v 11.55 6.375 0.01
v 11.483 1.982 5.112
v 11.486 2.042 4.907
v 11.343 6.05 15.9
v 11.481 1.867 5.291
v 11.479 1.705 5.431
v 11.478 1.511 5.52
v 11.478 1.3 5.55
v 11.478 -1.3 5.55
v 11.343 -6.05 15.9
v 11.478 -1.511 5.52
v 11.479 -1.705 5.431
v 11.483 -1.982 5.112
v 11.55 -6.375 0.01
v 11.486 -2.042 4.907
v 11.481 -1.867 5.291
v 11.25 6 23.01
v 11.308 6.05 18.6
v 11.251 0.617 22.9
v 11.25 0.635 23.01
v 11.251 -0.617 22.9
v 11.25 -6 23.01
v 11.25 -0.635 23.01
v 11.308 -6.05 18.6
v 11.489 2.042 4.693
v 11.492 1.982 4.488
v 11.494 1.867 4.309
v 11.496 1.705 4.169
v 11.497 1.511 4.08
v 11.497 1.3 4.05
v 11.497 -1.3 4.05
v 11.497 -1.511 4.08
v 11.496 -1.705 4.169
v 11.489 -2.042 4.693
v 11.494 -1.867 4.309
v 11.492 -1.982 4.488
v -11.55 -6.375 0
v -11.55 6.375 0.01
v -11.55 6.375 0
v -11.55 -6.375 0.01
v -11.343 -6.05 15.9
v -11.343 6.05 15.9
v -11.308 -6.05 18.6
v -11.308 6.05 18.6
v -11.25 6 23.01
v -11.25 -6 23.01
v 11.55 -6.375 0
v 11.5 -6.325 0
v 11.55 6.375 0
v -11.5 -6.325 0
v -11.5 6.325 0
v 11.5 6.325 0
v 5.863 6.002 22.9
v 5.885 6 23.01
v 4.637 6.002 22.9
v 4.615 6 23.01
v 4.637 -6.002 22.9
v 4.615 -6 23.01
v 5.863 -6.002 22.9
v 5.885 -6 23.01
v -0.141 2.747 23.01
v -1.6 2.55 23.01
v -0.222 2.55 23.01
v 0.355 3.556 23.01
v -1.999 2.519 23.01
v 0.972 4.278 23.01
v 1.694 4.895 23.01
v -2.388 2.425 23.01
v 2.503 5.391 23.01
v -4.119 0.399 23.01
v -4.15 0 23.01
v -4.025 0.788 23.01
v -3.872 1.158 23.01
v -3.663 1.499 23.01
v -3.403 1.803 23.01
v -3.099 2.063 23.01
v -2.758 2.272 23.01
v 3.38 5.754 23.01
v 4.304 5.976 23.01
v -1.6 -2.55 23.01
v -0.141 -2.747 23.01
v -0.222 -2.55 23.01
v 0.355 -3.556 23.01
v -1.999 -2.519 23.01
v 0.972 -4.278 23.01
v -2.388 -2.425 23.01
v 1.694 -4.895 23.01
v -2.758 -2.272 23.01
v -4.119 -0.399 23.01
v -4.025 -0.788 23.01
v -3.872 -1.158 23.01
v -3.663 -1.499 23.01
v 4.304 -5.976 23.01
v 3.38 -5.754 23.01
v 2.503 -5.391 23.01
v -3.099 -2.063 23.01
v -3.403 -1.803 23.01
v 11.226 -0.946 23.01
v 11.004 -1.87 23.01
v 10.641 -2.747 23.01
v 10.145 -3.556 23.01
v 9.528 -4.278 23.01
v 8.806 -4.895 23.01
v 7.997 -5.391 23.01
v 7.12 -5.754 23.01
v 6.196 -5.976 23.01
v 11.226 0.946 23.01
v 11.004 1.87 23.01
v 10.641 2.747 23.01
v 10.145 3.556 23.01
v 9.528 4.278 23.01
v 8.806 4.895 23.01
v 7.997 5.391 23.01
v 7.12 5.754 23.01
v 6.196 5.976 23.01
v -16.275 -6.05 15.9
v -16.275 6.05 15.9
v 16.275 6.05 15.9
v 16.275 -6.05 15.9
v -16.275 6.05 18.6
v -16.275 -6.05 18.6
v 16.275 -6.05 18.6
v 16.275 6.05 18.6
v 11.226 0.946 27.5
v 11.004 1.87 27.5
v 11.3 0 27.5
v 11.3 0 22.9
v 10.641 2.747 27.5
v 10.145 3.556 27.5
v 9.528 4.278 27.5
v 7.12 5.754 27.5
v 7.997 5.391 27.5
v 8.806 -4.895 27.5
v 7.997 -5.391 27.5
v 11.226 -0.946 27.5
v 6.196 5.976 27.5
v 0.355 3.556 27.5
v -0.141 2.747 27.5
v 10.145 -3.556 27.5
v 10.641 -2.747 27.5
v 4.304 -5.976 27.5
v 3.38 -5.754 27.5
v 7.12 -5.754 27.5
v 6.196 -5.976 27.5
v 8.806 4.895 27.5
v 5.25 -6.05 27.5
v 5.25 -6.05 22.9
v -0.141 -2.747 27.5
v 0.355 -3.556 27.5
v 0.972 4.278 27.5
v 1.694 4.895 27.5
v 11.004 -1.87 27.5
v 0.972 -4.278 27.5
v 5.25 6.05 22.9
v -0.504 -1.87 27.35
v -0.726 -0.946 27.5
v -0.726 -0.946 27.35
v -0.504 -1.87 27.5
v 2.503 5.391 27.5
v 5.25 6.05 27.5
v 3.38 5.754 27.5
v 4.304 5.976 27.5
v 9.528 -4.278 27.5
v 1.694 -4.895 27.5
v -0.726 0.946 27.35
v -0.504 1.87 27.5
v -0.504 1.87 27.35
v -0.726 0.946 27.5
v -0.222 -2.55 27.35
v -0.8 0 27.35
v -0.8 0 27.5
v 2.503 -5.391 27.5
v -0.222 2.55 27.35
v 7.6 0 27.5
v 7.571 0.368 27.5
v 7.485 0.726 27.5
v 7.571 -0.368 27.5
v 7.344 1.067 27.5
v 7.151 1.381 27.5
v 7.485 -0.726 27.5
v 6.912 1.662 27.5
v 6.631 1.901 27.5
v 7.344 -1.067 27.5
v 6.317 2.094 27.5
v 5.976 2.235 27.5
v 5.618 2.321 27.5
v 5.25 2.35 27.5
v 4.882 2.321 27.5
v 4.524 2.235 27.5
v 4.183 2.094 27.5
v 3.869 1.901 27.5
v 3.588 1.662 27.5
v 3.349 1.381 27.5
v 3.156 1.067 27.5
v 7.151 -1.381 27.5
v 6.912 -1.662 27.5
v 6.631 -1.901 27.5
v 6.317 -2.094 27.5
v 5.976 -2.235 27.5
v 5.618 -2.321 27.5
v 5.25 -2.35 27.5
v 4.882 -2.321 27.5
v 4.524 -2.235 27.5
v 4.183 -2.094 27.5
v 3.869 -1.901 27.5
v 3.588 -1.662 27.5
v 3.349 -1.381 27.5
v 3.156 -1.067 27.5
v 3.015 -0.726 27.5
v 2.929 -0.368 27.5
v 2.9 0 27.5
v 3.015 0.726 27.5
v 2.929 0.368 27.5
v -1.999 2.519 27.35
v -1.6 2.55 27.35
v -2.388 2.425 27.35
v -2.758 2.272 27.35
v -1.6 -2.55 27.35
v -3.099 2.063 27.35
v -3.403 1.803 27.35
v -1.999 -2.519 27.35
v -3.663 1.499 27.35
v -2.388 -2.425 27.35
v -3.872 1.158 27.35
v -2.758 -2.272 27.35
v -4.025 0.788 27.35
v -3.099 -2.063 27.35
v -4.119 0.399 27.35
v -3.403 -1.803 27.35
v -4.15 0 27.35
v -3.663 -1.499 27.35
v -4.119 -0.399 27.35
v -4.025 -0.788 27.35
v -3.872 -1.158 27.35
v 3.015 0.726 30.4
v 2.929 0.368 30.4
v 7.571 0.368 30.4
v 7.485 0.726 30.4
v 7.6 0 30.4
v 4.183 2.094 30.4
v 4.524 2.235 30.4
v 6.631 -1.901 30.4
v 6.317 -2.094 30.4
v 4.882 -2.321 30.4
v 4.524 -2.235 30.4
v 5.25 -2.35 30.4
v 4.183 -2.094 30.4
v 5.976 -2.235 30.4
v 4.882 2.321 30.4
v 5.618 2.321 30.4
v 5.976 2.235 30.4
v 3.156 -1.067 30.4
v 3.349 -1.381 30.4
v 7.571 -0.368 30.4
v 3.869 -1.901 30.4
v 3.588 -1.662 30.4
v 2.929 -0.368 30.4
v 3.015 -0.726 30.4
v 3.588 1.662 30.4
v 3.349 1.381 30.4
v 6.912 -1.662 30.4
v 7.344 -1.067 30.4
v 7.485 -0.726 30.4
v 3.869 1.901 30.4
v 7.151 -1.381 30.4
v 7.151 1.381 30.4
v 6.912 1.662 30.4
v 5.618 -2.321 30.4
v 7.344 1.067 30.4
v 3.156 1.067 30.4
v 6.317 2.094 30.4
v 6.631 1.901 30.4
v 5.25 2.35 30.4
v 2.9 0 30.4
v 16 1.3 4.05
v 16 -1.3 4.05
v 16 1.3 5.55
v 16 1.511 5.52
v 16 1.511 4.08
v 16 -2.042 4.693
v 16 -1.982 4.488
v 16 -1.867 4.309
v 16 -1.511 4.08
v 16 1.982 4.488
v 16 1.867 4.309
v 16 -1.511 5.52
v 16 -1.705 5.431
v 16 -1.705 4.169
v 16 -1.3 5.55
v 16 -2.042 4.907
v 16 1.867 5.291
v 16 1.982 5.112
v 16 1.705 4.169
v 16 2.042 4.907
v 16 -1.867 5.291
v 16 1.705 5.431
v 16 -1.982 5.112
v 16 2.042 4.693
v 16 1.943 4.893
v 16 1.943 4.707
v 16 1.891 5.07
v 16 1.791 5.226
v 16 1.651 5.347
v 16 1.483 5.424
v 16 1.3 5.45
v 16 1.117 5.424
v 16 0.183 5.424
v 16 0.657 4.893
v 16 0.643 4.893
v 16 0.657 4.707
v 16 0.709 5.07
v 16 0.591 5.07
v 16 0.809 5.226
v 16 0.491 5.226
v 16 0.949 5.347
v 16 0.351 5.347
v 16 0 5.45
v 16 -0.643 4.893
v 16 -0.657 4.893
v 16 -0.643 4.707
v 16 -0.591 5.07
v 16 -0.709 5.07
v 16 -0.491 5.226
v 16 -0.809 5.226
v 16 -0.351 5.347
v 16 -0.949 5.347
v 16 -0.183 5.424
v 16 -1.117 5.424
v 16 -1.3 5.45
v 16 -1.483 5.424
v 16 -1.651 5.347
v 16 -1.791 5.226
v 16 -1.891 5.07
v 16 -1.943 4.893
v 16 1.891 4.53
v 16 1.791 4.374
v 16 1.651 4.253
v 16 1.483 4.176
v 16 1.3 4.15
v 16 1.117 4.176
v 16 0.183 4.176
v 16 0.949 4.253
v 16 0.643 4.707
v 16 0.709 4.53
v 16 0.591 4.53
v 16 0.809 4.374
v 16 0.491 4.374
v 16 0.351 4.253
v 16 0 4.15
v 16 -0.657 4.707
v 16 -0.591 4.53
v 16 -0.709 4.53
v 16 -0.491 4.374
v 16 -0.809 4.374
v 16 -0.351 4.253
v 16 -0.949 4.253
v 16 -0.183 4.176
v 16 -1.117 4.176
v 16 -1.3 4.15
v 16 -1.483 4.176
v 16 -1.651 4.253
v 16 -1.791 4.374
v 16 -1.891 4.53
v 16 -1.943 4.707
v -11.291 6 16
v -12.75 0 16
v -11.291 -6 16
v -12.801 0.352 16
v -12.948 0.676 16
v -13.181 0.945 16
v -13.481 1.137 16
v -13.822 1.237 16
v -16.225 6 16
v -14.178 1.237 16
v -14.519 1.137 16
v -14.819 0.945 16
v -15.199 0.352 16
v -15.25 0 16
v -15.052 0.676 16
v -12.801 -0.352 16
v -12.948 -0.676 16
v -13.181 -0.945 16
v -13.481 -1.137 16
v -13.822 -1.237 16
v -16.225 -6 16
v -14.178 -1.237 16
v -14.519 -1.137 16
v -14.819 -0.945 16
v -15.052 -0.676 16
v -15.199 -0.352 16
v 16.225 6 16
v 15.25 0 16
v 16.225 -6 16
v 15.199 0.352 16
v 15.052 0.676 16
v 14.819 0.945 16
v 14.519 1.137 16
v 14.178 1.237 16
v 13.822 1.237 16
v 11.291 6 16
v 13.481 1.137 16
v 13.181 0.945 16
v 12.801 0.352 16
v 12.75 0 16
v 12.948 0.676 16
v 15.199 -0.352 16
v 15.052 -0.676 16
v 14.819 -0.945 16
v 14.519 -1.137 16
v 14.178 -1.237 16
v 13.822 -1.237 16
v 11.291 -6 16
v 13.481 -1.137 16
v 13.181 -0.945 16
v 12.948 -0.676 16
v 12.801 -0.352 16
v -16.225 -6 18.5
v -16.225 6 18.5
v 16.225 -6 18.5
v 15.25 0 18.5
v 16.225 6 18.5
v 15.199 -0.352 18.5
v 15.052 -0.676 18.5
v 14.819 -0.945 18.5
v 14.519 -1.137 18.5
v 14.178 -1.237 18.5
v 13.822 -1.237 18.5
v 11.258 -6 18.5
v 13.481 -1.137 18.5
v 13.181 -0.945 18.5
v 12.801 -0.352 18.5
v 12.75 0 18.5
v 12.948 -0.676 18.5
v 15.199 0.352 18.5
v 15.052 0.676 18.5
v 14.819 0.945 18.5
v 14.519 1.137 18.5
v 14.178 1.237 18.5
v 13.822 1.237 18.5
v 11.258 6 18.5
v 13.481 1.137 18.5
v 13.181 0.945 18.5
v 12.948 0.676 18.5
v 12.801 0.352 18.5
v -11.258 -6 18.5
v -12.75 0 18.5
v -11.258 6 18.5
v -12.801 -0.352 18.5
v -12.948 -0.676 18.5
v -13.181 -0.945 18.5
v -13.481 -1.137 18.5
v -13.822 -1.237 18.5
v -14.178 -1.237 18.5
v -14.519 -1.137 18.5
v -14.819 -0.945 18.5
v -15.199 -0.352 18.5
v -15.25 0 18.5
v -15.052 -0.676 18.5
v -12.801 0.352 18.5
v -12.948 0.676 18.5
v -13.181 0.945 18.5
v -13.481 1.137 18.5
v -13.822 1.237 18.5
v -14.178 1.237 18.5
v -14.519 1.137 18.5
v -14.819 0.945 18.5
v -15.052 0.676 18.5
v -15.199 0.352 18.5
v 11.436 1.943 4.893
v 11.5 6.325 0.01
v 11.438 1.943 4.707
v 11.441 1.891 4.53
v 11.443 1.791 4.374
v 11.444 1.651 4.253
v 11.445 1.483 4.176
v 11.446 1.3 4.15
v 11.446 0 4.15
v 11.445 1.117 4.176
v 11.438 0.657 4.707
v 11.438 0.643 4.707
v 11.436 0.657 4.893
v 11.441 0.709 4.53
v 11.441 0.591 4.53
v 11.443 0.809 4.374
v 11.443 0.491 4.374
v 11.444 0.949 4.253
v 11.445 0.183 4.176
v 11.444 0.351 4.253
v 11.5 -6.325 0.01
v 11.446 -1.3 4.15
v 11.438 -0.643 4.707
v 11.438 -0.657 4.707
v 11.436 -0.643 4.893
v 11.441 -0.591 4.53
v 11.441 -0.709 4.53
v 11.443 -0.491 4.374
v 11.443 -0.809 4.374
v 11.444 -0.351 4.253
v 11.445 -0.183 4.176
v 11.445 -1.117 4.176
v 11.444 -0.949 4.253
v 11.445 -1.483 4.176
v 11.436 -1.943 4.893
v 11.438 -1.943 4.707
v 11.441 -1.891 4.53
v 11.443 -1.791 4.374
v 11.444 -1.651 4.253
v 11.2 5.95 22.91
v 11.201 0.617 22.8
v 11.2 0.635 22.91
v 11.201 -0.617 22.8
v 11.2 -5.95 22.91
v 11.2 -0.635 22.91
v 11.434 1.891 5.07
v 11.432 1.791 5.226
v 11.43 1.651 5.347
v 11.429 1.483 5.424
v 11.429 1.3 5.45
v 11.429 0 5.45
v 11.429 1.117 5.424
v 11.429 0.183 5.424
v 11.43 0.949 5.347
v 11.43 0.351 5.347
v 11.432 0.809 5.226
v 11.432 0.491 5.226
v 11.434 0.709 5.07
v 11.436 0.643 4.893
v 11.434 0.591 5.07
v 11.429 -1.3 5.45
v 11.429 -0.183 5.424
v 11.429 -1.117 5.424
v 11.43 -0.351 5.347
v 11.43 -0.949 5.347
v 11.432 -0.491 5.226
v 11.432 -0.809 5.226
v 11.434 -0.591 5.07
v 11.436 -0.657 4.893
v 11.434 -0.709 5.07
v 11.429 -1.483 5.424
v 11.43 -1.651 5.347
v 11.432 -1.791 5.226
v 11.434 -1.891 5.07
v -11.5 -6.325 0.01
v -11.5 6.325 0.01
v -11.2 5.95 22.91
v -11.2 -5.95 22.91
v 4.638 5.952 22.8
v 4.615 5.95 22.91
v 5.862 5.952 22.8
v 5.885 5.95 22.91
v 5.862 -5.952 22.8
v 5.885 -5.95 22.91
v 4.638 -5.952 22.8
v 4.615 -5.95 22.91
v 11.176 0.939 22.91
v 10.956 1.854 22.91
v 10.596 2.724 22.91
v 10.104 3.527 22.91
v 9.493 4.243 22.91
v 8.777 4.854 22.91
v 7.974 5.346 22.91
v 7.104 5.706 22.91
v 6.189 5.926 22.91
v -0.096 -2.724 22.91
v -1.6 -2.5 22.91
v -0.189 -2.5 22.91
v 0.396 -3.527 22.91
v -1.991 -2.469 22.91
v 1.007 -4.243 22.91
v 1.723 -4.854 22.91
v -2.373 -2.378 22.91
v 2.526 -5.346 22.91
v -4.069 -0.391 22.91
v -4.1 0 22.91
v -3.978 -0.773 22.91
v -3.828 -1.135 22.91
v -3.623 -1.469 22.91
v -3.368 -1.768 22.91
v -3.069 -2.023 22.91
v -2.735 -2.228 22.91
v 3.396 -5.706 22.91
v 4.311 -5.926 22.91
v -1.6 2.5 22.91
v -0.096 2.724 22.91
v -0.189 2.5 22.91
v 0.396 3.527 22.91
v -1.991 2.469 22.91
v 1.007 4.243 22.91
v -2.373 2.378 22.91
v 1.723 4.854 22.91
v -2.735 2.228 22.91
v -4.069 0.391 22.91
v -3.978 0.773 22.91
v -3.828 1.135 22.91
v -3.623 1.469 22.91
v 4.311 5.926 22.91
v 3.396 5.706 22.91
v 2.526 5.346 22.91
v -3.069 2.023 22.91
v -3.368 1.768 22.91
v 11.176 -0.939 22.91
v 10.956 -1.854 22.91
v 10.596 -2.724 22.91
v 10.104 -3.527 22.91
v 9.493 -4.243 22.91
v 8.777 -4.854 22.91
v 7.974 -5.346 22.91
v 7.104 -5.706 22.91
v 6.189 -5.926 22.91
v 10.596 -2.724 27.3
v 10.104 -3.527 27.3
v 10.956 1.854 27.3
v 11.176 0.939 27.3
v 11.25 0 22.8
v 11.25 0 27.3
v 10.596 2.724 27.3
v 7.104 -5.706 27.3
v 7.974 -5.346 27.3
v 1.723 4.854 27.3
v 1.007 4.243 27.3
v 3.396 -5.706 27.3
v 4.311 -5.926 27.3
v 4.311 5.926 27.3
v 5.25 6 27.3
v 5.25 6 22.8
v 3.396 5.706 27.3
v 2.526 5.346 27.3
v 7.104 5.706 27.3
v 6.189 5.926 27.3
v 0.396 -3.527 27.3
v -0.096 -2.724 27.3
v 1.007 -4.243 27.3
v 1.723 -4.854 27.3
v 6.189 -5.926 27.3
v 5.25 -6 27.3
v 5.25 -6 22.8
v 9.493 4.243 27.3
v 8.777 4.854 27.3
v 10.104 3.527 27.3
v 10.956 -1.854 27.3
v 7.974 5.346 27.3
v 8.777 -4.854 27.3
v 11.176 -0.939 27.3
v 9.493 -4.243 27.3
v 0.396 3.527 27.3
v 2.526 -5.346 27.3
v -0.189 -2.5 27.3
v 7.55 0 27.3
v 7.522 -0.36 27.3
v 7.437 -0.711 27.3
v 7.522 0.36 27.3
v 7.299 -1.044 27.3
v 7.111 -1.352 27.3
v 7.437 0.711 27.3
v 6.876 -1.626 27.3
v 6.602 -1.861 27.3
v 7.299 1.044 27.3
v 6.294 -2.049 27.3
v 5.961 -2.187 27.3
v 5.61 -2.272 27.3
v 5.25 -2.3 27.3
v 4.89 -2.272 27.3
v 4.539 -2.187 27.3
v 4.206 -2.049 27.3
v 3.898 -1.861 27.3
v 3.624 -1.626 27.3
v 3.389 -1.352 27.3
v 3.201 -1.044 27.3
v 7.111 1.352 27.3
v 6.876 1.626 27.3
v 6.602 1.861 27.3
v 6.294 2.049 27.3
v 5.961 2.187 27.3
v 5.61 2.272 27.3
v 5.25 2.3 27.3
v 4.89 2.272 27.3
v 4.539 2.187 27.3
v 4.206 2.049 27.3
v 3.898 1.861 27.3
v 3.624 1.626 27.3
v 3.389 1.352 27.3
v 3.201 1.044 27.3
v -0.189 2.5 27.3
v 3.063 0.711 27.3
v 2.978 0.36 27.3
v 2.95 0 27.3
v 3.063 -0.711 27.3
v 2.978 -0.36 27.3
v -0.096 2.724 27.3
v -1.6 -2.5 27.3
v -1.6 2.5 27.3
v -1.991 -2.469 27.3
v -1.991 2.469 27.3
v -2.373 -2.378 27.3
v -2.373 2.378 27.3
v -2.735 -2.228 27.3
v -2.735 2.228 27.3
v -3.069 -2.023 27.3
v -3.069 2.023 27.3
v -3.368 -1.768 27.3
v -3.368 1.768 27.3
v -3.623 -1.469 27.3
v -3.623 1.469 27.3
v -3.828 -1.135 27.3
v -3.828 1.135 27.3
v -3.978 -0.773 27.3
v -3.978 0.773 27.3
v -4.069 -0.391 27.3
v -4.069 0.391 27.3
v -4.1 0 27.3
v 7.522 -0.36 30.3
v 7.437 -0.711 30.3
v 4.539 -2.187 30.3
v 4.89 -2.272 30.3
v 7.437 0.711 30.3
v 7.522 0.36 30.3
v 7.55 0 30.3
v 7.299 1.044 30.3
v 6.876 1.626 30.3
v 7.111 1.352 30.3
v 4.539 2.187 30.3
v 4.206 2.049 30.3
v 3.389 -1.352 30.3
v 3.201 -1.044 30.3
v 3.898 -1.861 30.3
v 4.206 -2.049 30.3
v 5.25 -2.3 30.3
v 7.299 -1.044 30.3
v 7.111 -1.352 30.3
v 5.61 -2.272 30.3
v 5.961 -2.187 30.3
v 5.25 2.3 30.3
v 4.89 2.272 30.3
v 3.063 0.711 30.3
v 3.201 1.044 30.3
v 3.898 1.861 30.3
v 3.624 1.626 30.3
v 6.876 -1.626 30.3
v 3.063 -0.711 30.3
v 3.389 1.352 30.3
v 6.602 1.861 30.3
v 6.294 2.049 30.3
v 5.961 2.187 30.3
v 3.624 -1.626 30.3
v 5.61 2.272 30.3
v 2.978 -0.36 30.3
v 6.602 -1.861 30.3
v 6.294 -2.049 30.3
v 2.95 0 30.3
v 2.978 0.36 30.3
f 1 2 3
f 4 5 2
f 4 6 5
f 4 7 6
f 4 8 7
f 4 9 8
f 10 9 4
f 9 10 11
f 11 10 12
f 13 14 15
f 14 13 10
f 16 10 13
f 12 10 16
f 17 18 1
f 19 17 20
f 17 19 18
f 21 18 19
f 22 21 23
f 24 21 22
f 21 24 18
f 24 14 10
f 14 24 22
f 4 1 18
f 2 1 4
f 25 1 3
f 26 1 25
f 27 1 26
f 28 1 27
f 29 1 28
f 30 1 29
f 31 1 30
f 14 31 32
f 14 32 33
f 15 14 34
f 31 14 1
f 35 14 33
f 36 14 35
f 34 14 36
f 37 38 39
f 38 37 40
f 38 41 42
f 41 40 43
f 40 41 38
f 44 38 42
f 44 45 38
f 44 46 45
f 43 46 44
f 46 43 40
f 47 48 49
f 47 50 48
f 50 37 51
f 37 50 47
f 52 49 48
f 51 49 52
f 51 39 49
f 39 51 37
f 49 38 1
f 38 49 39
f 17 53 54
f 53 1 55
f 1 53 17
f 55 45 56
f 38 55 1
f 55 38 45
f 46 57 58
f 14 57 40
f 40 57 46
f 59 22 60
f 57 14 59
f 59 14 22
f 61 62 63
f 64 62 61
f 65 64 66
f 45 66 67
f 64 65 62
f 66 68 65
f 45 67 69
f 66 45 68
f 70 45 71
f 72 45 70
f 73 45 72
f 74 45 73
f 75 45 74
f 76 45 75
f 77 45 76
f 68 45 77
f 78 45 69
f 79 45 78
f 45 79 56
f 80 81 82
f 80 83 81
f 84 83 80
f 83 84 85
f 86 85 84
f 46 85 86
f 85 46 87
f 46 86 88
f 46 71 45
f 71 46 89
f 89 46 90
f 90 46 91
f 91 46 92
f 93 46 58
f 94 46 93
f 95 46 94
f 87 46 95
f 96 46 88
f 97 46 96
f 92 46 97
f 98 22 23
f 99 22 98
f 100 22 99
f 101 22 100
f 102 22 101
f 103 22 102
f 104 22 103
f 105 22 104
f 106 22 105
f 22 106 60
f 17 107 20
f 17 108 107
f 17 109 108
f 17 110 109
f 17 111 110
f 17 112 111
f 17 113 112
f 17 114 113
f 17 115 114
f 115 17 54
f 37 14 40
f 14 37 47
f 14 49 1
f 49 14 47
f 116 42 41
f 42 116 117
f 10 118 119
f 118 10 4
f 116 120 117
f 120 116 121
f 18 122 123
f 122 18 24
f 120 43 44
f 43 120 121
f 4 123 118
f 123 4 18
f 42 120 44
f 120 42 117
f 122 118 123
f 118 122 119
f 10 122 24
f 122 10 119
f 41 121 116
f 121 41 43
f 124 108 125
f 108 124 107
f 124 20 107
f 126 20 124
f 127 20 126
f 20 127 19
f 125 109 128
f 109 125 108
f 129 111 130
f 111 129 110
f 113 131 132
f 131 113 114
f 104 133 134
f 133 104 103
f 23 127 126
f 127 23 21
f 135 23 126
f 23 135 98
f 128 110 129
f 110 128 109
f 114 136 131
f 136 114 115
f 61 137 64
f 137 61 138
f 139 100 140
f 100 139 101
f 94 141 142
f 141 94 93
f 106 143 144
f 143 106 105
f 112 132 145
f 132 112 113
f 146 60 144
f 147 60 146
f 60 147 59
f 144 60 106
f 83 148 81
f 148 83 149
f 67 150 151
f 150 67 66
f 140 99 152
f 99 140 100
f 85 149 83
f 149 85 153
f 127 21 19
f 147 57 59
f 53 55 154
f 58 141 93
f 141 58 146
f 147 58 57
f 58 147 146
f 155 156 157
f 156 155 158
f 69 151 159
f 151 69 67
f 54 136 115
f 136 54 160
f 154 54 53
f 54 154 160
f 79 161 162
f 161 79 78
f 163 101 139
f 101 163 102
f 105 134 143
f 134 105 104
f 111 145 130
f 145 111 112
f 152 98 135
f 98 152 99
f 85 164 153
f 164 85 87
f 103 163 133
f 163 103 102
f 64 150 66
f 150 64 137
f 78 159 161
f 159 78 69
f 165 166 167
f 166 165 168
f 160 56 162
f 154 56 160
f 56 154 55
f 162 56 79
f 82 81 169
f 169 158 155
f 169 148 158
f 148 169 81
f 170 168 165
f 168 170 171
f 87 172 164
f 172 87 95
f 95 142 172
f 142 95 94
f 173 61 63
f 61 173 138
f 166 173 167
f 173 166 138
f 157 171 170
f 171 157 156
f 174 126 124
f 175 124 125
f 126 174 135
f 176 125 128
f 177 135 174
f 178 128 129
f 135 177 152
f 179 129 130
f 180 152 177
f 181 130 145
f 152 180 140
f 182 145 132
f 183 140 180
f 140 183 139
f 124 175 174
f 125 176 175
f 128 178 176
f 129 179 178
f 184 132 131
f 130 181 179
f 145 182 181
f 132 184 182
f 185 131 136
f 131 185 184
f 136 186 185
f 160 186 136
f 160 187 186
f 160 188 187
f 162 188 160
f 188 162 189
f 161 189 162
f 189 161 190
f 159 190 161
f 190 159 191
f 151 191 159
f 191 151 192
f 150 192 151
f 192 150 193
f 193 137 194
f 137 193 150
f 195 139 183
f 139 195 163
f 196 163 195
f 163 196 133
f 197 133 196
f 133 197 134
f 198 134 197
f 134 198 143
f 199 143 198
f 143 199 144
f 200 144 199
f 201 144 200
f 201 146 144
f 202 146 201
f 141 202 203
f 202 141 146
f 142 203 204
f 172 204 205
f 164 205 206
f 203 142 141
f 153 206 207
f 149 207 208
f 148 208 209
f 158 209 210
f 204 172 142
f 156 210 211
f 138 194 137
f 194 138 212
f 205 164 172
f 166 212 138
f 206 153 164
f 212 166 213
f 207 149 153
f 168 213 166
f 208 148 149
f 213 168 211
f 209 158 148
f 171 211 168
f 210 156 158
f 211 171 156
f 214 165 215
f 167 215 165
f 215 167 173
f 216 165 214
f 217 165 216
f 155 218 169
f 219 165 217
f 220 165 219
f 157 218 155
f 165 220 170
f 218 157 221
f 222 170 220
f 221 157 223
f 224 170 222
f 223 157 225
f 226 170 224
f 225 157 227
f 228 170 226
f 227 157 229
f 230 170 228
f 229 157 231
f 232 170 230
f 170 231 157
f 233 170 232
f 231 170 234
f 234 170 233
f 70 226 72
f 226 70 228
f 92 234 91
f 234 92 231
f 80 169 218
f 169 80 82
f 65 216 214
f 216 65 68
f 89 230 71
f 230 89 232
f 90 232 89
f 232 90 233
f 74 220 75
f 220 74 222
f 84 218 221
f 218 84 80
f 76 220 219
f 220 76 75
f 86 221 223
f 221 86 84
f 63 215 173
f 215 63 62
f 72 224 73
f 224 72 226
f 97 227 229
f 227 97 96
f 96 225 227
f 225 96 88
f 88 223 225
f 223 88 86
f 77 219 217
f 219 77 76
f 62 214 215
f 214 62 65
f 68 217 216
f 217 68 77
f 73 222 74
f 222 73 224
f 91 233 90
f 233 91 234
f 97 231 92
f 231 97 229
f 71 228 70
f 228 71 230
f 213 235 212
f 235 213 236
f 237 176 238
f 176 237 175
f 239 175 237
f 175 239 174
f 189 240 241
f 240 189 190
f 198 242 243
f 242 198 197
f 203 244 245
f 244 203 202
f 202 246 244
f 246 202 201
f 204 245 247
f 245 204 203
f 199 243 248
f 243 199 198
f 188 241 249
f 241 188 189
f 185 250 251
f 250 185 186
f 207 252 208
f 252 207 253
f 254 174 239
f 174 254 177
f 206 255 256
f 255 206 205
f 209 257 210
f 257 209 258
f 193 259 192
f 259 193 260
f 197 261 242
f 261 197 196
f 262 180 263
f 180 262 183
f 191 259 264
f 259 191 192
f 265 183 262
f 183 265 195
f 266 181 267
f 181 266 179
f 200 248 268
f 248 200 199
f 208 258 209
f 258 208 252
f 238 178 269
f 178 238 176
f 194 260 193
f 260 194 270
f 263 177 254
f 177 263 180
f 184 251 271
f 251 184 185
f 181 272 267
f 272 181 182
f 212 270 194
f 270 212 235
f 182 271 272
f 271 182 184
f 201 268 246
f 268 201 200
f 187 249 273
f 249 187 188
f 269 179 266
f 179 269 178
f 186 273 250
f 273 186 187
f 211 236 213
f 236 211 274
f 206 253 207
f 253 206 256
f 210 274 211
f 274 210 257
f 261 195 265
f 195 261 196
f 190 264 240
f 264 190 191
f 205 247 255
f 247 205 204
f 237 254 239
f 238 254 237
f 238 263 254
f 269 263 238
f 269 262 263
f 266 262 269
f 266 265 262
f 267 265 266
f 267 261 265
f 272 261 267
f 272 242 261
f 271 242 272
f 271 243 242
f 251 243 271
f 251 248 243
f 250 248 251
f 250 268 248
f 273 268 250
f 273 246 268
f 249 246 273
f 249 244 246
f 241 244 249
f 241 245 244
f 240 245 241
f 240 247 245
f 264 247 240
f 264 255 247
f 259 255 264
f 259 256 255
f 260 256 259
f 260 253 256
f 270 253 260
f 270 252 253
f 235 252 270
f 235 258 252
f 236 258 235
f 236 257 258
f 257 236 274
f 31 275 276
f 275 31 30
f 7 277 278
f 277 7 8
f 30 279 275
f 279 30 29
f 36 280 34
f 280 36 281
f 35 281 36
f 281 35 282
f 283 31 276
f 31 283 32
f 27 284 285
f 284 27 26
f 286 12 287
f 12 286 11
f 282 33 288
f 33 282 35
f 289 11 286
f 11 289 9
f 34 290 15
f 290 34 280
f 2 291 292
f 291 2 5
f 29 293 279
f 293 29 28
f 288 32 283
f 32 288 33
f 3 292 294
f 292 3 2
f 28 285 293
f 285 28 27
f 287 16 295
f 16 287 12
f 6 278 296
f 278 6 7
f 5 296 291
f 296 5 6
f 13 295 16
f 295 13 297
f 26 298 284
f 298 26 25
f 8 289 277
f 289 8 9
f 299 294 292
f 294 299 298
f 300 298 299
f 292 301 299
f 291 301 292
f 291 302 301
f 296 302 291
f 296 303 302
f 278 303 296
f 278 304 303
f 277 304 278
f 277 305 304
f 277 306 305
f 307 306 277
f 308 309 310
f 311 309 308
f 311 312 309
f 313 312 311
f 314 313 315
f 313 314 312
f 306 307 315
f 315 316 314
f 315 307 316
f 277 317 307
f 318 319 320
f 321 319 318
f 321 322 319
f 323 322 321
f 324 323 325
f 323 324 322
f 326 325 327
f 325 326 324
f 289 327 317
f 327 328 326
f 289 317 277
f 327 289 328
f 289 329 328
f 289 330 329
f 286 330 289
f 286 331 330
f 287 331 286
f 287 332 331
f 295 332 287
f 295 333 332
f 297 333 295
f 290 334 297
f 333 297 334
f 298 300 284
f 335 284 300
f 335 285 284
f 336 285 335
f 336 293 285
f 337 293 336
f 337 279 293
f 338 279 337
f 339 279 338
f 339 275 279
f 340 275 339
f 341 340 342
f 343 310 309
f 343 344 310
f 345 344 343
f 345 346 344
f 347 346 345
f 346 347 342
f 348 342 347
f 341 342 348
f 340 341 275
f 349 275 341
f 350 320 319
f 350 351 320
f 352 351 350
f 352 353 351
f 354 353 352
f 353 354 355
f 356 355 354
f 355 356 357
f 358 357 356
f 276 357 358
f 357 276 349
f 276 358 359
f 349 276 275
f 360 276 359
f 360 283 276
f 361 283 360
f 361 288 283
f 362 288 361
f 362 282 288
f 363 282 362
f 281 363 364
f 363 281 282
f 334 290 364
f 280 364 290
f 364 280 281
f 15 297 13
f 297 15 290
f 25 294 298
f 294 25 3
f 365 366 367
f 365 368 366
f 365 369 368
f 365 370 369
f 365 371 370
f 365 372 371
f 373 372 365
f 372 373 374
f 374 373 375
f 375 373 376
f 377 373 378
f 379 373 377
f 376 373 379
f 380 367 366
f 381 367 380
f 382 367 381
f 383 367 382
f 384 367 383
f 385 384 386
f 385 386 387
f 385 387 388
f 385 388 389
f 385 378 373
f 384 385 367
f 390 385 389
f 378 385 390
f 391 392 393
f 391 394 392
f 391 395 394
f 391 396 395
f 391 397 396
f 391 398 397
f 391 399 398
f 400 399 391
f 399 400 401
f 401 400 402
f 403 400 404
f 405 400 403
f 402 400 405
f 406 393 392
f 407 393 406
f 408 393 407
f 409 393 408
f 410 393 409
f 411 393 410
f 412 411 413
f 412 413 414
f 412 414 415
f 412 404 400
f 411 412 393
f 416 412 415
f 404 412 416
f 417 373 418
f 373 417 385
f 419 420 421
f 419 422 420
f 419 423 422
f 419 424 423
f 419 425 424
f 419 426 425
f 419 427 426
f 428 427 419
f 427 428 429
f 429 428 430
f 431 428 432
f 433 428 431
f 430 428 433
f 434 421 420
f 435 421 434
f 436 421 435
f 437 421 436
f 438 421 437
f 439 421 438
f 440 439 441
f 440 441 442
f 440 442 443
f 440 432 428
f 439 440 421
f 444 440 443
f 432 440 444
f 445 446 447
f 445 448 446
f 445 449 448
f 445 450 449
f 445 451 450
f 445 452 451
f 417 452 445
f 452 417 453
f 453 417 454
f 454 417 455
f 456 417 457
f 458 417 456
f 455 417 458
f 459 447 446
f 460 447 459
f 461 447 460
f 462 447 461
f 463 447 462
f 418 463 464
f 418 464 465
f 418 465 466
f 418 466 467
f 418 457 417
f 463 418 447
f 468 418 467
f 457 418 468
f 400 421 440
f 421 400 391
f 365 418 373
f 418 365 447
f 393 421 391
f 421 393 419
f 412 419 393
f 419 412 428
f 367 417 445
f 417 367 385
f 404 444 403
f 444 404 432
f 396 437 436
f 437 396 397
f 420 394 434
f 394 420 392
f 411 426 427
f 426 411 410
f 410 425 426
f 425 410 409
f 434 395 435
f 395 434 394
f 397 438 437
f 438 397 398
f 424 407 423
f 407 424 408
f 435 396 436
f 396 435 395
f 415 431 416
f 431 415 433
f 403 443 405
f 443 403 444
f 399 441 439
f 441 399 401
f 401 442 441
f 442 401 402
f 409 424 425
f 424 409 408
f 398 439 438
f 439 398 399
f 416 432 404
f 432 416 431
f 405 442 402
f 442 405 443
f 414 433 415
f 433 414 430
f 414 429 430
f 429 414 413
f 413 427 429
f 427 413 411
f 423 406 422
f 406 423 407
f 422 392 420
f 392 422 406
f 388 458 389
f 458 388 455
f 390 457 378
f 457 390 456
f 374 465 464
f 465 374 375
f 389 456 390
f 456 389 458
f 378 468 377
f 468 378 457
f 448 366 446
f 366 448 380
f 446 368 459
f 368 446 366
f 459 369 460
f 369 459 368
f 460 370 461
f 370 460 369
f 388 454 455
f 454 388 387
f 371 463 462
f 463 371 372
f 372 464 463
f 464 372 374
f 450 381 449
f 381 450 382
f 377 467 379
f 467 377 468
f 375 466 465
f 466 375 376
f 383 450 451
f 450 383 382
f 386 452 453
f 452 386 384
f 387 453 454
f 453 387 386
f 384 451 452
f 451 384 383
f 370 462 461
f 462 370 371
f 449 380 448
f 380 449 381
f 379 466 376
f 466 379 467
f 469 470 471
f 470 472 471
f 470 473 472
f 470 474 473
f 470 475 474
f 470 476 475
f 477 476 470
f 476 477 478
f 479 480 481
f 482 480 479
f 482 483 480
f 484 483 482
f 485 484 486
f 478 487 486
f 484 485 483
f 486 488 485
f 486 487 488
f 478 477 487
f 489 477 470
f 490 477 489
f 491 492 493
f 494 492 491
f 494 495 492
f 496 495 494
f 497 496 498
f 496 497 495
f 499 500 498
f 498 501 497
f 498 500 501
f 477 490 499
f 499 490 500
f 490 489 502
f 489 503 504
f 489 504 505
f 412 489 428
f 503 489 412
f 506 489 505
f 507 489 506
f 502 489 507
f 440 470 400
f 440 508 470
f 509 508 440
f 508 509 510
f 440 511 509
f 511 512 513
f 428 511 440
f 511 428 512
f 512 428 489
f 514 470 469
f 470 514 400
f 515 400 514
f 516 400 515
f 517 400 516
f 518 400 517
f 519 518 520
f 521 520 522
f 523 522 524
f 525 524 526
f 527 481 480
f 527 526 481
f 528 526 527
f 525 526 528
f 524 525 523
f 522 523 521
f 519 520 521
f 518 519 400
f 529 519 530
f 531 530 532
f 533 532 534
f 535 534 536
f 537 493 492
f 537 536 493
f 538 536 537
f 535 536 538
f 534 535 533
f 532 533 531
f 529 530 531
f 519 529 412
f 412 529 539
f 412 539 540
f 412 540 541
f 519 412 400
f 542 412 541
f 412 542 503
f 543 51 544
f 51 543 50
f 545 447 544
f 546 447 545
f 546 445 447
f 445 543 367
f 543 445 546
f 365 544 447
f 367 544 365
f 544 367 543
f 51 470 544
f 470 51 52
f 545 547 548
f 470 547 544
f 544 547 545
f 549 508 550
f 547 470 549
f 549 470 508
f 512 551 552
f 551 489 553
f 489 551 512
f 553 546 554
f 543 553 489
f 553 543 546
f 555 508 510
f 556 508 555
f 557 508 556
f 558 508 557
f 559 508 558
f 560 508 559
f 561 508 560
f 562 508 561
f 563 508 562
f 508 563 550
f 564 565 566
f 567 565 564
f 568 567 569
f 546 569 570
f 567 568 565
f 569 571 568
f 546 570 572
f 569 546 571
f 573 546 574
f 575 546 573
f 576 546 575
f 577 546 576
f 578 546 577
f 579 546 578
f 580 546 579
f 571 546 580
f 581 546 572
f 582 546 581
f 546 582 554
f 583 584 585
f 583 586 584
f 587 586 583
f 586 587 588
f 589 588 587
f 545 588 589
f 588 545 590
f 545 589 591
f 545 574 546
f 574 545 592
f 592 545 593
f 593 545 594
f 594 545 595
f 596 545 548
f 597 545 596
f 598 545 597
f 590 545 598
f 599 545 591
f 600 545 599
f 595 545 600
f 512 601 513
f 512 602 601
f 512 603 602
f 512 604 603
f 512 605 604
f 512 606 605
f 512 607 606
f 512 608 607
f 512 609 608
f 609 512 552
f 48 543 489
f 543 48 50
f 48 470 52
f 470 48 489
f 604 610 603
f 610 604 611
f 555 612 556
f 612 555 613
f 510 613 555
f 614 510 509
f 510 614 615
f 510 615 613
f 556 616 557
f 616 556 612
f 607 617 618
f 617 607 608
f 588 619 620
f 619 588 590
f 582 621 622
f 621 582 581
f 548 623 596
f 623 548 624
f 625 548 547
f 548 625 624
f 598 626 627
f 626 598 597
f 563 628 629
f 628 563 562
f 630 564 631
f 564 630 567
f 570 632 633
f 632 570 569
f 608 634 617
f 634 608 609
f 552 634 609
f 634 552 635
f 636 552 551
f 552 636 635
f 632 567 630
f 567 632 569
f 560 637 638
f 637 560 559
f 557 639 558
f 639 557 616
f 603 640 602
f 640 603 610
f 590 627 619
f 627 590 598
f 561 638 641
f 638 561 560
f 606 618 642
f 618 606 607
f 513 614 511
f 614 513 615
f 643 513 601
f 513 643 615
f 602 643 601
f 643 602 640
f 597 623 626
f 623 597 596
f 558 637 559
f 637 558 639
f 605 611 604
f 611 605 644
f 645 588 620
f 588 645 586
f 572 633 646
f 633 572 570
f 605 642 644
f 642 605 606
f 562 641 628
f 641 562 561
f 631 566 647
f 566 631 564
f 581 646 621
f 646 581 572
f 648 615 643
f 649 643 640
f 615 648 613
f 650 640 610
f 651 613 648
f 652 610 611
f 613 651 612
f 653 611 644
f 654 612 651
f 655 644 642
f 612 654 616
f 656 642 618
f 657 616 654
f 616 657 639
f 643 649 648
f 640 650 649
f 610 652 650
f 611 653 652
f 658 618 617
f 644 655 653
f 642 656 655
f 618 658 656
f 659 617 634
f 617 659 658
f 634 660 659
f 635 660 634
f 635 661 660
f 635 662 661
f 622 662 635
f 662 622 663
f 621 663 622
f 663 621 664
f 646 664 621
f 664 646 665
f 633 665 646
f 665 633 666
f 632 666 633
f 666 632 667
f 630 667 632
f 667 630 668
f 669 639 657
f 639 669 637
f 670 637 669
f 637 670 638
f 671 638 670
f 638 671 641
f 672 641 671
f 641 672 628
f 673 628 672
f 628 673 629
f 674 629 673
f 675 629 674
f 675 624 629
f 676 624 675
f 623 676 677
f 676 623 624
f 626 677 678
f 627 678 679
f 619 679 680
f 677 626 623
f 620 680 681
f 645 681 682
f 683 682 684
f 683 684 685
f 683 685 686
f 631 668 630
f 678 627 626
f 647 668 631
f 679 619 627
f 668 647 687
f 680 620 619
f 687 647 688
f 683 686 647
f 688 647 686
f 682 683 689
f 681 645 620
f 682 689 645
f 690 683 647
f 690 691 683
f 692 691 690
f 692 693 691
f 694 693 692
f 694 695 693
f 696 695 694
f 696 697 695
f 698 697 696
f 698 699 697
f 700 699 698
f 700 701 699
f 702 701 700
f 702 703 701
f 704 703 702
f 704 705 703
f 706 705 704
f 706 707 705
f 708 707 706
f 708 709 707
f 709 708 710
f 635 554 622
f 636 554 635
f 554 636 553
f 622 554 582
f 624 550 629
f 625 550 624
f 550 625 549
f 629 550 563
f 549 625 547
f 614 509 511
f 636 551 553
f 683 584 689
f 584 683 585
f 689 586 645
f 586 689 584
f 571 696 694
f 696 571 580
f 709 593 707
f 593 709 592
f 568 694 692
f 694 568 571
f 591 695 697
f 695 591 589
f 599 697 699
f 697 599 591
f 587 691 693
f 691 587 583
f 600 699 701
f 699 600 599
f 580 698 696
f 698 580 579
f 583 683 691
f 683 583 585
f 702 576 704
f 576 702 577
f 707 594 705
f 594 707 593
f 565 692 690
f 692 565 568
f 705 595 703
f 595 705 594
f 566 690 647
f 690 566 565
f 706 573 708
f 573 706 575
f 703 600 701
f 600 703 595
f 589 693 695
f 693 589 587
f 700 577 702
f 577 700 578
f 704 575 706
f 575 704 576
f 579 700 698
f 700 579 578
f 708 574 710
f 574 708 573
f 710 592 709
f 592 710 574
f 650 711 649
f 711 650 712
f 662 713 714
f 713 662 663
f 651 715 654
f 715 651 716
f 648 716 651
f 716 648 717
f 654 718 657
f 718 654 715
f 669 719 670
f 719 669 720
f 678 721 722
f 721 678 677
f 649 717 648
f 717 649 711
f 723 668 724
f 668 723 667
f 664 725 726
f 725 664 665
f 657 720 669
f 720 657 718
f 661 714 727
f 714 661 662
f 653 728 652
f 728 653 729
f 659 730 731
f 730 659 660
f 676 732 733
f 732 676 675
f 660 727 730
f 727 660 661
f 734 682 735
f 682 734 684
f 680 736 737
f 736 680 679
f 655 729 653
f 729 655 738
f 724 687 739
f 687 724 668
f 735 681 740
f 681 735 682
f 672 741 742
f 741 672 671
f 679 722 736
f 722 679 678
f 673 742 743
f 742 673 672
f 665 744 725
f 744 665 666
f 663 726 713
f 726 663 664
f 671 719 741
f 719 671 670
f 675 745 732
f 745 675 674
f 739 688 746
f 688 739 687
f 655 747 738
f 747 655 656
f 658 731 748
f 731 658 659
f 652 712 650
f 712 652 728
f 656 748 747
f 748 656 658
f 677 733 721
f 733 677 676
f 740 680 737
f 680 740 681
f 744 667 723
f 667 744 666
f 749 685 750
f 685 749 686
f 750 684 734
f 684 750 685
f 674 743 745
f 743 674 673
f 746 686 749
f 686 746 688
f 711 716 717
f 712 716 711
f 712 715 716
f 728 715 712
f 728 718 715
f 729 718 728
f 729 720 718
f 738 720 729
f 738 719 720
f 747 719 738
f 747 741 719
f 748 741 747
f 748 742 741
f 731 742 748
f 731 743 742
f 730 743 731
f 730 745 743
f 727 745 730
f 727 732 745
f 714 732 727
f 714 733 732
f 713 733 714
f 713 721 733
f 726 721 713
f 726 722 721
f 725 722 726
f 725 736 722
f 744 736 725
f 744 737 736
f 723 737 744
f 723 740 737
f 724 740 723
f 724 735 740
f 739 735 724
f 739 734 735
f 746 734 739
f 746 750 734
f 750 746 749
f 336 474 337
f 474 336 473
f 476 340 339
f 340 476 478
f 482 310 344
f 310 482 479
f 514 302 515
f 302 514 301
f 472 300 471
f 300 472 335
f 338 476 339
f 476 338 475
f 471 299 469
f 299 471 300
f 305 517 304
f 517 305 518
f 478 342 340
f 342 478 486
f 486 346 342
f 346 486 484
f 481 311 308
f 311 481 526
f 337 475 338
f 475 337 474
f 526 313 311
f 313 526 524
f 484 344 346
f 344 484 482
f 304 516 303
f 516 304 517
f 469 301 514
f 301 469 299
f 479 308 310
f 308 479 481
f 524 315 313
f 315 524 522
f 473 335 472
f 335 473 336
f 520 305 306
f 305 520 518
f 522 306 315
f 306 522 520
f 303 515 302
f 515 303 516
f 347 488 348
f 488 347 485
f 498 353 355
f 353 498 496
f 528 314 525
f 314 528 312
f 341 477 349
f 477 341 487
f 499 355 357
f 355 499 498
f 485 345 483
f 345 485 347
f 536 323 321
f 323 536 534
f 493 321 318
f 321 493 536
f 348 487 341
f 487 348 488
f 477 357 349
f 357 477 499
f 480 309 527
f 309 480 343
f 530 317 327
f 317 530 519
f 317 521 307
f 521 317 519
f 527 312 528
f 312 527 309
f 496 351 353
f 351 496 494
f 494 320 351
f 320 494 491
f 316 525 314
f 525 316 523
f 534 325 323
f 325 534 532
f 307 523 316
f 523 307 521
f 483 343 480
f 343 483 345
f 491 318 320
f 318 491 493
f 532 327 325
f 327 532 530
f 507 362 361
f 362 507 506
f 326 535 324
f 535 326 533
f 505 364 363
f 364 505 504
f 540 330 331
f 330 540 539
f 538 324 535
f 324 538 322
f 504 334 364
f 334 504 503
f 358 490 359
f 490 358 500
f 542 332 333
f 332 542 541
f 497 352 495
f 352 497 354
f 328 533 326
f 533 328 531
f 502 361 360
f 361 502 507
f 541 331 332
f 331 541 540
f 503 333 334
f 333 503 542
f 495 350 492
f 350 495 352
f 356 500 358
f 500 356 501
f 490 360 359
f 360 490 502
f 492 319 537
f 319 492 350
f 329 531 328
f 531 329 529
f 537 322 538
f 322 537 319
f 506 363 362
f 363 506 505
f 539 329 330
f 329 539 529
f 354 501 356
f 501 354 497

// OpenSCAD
// Pan Tilt PiCamera for the Bots project

//-------------------------------------
module servo1 (){
// Servo body
hull(){
  linear_extrude(height=0.01)
  square([23,12.65],center=true);

  translate([0,0,22.9])
  linear_extrude(height=0.01)
  square([22.4,11.9],center=true);
}
// Tabs
difference(){
    translate([0,0,16])
    linear_extrude(height=2.5)
    square([32.45,12.0],center=true);
     
    translate([14,0,16])
    cylinder(h=3,r=1.25,$fn=22);
    translate([-14,0,16])
    cylinder(h=3,r=1.25,$fn=22);
}
// Collar
translate([5.25,0,22.8])
cylinder(h=4.5,r=6,$fn=40);
hull(){
    translate([-1.6,0,22.8])
    cylinder(h=4.5,r=2.5,$fn=40);
    translate([2,0,22.8])
    cylinder(h=4.5,r=2.5,$fn=40);
}
// Shaft
color("red")
translate([5.25,0,0])
cylinder(h=30.3,r=2.3,$fn=40);

// Wires
color("red")
translate([10,1.3,4.8])
rotate([0,90,0])
cylinder(h=6,r=1.3/2,$fn=22);
color("orange")
translate([10,0,4.8])
rotate([0,90,0])
cylinder(h=6,r=1.3/2,$fn=22);
color("brown")
translate([6,-1.3,4.8])
rotate([0,90,0])
cylinder(h=10,r=1.3/2,$fn=22);

} // --------- end module servo1 -------

module servo1cut (tol=0.1){
// Servo body
hull(){
  linear_extrude(height=0.01)
  square([23+tol,12.65+tol],center=true);

  translate([0,0,22.9+tol])
  linear_extrude(height=0.01)
  square([22.4+tol,11.9+tol],center=true);
}
// Tabs
difference(){
    translate([0,0,16-tol])
    linear_extrude(height=2.5+2*tol)
    square([32.45+tol,12.0+tol],center=true);
}

// Collar
translate([5.25,0,22.8+tol])
cylinder(h=4.5+tol,r=6+tol/2,$fn=40);
hull(){
    translate([-1.6,0,22.8])
    cylinder(h=4.5+tol/2,r=2.5+tol/2,$fn=40);
    translate([2,0,22.8])
    cylinder(h=4.5+tol/2,r=2.5+tol/2,$fn=40);
}
// Shaft
color("red")
translate([5.25,0,0])
cylinder(h=30.3+tol,r=2.3+tol/2,$fn=40);

// Wires
hull(){
    color("red")
    translate([10,1.3,4.8])
    rotate([0,90,0])
    cylinder(h=6,r=1.3/2+tol,$fn=22);
    color("brown")
    translate([6,-1.3,4.8])
    rotate([0,90,0])
    cylinder(h=10,r=1.3/2+tol,$fn=22);
}
} // --------- end module servo1cut -------

difference(){
servo1cut();
servo1();
}

//translate([0,30,0])
//servo1cut();
